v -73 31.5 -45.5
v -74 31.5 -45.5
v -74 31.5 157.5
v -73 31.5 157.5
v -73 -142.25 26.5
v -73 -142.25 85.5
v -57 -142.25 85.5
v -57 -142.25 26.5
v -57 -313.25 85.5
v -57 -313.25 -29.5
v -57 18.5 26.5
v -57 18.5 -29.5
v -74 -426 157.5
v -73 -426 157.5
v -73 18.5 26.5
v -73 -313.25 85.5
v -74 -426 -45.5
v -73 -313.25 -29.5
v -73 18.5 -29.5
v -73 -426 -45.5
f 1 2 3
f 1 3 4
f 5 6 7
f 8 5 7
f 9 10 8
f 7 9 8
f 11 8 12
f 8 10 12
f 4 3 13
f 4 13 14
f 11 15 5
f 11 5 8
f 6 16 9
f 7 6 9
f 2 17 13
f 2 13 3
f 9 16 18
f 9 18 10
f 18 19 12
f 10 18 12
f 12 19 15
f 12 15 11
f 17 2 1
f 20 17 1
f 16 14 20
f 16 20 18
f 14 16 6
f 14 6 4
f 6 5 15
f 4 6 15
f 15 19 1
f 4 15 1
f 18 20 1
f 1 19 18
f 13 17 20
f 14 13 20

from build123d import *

# Parameters (mm, degrees)
BOX012_W     = 17
BOX012_H     = 171
BOX012_DEPTH = 115
BOX013_W     = 1
BOX013_H     = 457.5
BOX013_DEPTH = 203
BOX011_W     = 17
BOX011_H     = 160.75
BOX011_DEPTH = 56


with BuildPart() as slots:
    # Box012 → Box012 (new body)
    with BuildSketch(Plane(origin=(-74, -313.25, -29.5), x_dir=(1, 0, 0), z_dir=(0, 0, 1))):
        with Locations((8.5, 85.5)):
            Rectangle(BOX012_W, BOX012_H)
    extrude(amount=BOX012_DEPTH)


with BuildPart() as back:
    # Box013 → Box013 (new body)
    with BuildSketch(Plane(origin=(-74, -426, -45.5), x_dir=(1, 0, 0), z_dir=(0, 0, 1))):
        with Locations((0.5, 228.75)):
            Rectangle(BOX013_W, BOX013_H)
    extrude(amount=BOX013_DEPTH)


with BuildPart() as tower_back:
    # Box011 → Box011 (new body)
    with BuildSketch(Plane(origin=(-74, -142.25, -29.5), x_dir=(1, 0, 0), z_dir=(0, 0, 1))):
        with Locations((8.5, 80.375)):
            Rectangle(BOX011_W, BOX011_H)
    extrude(amount=BOX011_DEPTH)

    # Fusion037: union Slots, Back
    add(slots.part)
    add(back.part)


solid = tower_back.part
